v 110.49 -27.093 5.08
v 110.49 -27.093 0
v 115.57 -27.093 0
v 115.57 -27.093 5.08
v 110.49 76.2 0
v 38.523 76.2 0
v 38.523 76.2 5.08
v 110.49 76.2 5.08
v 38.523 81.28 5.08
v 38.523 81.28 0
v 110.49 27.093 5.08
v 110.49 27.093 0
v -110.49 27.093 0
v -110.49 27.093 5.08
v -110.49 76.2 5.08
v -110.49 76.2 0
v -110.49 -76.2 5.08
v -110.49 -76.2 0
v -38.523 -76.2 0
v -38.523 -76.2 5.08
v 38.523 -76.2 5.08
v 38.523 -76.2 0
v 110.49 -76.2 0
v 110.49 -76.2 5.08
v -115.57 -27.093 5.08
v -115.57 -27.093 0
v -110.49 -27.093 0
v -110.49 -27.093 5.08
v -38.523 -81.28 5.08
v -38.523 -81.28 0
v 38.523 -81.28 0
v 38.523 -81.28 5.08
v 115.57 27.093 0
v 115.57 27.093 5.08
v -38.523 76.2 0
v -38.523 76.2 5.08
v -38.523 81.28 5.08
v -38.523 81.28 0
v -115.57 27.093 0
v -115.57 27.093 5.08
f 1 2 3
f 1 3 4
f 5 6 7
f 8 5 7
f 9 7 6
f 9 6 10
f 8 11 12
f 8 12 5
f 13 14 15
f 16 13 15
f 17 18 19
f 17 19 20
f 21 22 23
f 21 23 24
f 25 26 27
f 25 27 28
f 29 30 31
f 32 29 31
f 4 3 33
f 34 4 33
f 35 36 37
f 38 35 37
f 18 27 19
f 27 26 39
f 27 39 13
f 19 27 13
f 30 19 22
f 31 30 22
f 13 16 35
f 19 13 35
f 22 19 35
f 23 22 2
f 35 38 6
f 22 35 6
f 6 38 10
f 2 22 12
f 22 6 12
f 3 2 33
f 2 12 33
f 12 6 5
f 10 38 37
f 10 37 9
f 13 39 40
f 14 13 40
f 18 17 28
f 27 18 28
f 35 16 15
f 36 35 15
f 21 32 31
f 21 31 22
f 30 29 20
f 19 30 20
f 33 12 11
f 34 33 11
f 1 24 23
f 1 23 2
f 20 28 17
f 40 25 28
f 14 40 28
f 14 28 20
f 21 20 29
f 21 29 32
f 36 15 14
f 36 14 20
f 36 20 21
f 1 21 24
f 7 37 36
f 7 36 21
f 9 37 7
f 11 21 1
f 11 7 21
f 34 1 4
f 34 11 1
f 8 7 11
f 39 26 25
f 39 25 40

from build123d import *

# Parameters (mm, degrees)
SKETCH1_W           = 231.14
SKETCH1_H           = 162.56
BOSS_EXTRUDE1_DEPTH = 5.08
CAVITY1_START       = -115.57
CAVITY1_OUTLINE_W   = 5.08
CAVITY1_OUTLINE_H   = 5.08
CAVITY1_DEPTH       = 77.046666667
CAVITY1_START_2     = 38.523333333
CAVITY1_2_OUTLINE_W = 5.08
CAVITY1_2_OUTLINE_H = 5.08
CAVITY1_2_DEPTH     = 77.046666667
CAVITY1_3_OUTLINE_W = 49.106666667
CAVITY1_3_OUTLINE_H = 5.08
CAVITY1_3_DEPTH     = 5.08
CAVITY1_START_3     = 110.49
CAVITY1_4_OUTLINE_W = 49.106666667
CAVITY1_4_OUTLINE_H = 5.08
CAVITY1_4_DEPTH     = 5.08


# Read off the part's stored shape, not the designer's step: Cavity1
with BuildPart() as part:
    # Sketch1 → Boss-Extrude1 (new body)
    with BuildSketch(Plane.XY):
        Rectangle(SKETCH1_W, SKETCH1_H)
    extrude(amount=BOSS_EXTRUDE1_DEPTH)

    # Cavity1 outline → Cavity1 (cut)
    with BuildSketch(Plane.YZ.offset(CAVITY1_START)):
        with Locations((78.74, 2.54)):
            Rectangle(CAVITY1_OUTLINE_W, CAVITY1_OUTLINE_H)
        with Locations((-78.74, 2.54)):
            Rectangle(CAVITY1_OUTLINE_W, CAVITY1_OUTLINE_H)
    extrude(amount=CAVITY1_DEPTH, mode=Mode.SUBTRACT)

    # Cavity1 2 outline → Cavity1 2 (cut)
    with BuildSketch(Plane.YZ.offset(CAVITY1_START_2)):
        with Locations((78.74, 2.54)):
            Rectangle(CAVITY1_2_OUTLINE_W, CAVITY1_2_OUTLINE_H)
        with Locations((-78.74, 2.54)):
            Rectangle(CAVITY1_2_OUTLINE_W, CAVITY1_2_OUTLINE_H)
    extrude(amount=CAVITY1_2_DEPTH, mode=Mode.SUBTRACT)

    # Cavity1 3 outline → Cavity1 3 (cut)
    with BuildSketch(Plane.YZ.offset(CAVITY1_START)):
        with Locations((51.646666667, 2.54)):
            Rectangle(CAVITY1_3_OUTLINE_W, CAVITY1_3_OUTLINE_H)
        with Locations((-51.646666667, 2.54)):
            Rectangle(CAVITY1_3_OUTLINE_W, CAVITY1_3_OUTLINE_H)
    extrude(amount=CAVITY1_3_DEPTH, mode=Mode.SUBTRACT)

    # Cavity1 4 outline → Cavity1 4 (cut)
    with BuildSketch(Plane.YZ.offset(CAVITY1_START_3)):
        with Locations((51.646666667, 2.54)):
            Rectangle(CAVITY1_4_OUTLINE_W, CAVITY1_4_OUTLINE_H)
        with Locations((-51.646666667, 2.54)):
            Rectangle(CAVITY1_4_OUTLINE_W, CAVITY1_4_OUTLINE_H)
    extrude(amount=CAVITY1_4_DEPTH, mode=Mode.SUBTRACT)


solid = part.part
